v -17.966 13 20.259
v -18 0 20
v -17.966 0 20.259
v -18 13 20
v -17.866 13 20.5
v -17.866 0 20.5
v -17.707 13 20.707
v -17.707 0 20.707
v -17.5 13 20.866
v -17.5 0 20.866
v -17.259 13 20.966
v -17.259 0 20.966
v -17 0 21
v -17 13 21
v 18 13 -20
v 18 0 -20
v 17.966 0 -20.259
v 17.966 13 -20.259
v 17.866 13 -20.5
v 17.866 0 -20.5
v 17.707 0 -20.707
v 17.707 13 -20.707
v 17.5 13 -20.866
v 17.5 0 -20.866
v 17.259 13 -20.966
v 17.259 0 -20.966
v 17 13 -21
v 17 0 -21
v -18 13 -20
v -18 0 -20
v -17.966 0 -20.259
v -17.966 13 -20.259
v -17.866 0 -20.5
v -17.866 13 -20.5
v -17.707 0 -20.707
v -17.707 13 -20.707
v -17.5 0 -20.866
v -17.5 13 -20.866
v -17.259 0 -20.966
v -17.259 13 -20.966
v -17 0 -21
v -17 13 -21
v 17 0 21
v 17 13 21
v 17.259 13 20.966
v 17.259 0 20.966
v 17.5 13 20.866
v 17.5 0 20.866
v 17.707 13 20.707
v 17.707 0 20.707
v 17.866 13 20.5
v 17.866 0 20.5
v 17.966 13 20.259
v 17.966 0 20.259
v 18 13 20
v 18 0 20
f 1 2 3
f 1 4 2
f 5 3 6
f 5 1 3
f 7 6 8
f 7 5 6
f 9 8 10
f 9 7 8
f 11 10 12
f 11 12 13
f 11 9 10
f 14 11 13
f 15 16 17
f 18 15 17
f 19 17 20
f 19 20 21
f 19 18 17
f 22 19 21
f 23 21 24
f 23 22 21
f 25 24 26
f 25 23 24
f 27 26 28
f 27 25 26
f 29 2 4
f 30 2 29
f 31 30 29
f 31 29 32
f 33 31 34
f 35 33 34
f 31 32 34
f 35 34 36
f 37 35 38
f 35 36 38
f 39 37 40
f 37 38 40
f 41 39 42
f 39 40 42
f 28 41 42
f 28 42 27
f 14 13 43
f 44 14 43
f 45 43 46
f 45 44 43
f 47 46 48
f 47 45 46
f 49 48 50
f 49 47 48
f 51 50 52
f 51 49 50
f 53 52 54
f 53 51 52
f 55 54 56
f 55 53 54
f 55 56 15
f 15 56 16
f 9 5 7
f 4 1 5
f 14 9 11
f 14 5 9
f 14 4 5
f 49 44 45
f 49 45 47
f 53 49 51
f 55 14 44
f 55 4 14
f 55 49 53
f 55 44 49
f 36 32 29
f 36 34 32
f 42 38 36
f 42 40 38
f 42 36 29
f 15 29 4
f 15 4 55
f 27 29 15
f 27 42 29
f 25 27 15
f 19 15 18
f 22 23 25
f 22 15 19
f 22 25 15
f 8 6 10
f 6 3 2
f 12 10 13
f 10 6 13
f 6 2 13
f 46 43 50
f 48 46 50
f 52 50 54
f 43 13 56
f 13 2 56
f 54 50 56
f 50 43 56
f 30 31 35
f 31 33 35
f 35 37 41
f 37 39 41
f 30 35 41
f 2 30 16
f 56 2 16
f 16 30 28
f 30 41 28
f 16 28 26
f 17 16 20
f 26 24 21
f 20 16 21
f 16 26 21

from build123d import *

# Parameters (mm, degrees)
CROQUIS1_W              = 36
CROQUIS1_H              = 42
SALIENTE_EXTRUIR1_DEPTH = 13
REDONDEO1_R             = 1


with BuildPart() as part:
    # Croquis1 → Saliente-Extruir1 (new body)
    with BuildSketch(Plane(origin=(0, 0, 0), x_dir=(1, 0, 0), z_dir=(0, 1, 0))):
        Rectangle(CROQUIS1_W, CROQUIS1_H)
    extrude(amount=SALIENTE_EXTRUIR1_DEPTH)

    # Redondeo1
    redondeo1_edges = [part.edges().sort_by_distance(p)[0] for p in [
        (18, 6.5, 21),
        (-18, 6.5, 21),
        (-18, 6.5, -21),
        (18, 6.5, -21),
    ]]
    fillet(redondeo1_edges, radius=REDONDEO1_R)


solid = part.part
